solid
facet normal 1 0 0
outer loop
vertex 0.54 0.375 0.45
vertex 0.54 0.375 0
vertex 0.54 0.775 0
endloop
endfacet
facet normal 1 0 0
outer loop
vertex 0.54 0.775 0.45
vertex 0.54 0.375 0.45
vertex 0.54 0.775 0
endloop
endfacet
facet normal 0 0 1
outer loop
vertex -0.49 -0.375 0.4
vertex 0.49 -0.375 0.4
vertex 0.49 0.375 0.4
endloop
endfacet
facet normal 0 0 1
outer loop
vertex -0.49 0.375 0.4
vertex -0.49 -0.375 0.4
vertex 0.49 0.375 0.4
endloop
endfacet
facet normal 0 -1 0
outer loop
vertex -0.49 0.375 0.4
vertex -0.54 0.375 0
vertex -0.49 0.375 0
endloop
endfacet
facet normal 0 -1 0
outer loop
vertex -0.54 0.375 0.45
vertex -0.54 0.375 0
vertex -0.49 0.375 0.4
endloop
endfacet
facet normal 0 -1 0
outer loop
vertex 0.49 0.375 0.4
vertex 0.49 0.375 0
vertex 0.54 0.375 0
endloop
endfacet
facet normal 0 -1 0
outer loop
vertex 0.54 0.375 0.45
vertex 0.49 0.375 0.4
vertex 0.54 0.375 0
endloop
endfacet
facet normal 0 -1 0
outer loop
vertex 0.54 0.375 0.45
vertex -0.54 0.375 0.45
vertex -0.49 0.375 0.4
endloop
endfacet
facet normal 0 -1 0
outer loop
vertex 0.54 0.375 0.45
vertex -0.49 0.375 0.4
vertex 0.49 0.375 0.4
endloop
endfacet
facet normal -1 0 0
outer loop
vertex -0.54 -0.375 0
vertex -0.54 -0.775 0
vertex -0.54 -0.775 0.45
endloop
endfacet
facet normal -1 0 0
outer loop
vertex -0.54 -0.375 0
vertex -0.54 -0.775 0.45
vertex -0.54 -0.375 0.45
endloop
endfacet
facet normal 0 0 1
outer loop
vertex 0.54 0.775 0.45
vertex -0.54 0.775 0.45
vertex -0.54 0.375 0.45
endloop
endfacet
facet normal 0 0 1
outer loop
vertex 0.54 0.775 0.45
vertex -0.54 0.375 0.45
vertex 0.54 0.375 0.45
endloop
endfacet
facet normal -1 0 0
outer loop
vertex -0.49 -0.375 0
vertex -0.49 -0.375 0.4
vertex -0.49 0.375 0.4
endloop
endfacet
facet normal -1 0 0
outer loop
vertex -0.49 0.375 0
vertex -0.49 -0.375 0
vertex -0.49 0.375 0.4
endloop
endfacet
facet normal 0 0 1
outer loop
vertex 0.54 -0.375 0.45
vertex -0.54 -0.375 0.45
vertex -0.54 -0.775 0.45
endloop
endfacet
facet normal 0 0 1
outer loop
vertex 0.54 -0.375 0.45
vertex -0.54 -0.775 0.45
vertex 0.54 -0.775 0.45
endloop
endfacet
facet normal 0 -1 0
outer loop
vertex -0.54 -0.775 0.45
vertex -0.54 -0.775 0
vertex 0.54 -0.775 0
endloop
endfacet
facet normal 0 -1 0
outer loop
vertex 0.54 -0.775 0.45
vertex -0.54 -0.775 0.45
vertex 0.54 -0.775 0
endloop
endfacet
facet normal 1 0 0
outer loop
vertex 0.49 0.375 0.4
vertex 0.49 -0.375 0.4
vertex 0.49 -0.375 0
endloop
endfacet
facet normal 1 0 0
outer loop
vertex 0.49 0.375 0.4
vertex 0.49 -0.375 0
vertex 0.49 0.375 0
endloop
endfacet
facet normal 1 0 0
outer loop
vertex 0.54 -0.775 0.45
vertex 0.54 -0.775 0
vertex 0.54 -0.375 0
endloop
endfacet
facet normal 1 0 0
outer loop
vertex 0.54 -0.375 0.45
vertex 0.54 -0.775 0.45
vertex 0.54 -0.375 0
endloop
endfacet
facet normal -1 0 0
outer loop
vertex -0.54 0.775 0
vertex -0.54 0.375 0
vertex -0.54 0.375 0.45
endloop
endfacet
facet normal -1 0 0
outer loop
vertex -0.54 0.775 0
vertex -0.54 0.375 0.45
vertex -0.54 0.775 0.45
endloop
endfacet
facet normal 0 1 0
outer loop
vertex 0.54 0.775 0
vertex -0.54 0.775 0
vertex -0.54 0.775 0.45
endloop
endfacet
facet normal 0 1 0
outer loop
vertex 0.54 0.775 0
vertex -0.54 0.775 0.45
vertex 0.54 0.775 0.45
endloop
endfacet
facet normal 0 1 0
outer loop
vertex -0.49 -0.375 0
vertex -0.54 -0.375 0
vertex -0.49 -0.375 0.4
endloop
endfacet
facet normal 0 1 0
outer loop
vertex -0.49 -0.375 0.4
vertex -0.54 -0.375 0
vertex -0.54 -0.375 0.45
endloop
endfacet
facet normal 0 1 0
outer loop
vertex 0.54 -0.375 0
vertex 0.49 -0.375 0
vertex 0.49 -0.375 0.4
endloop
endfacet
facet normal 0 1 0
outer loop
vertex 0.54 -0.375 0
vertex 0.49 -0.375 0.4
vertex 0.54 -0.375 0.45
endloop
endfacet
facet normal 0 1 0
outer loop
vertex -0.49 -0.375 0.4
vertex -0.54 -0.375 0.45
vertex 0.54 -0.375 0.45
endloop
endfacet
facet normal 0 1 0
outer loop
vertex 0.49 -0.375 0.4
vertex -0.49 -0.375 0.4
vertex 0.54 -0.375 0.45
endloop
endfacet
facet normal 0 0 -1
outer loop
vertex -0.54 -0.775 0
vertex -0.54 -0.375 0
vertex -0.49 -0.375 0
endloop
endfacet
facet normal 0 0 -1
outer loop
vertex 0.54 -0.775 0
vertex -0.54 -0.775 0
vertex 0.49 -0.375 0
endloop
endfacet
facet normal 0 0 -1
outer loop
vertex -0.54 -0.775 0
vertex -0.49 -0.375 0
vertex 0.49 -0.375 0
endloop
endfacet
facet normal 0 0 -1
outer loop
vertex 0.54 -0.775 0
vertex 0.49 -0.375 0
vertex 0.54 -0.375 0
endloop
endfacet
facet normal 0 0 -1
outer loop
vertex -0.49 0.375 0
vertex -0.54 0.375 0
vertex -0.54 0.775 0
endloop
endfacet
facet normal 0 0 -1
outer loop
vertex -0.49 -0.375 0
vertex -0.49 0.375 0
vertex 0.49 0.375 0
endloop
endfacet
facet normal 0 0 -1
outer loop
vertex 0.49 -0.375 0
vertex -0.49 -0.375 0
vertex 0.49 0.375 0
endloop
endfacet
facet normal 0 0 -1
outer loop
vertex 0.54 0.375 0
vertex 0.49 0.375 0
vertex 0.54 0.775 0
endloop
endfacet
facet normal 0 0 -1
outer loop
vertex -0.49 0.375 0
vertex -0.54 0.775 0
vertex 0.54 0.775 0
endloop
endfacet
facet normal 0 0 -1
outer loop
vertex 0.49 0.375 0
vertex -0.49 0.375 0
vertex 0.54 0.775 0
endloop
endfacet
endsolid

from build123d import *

# Parameters (mm, degrees)
COMPONENT_OUTLINE_W = 1.08
COMPONENT_OUTLINE_H = 1.55
EXTRUDE1_DEPTH      = 0.45
SKETCH2_W           = 0.05
SKETCH2_H           = 0.75
CUT_EXTRUDE1_DEPTH  = 1.45
SKETCH3_W           = 0.05
SKETCH3_H           = 0.75
CUT_EXTRUDE2_DEPTH  = 2.03


with BuildPart() as part:
    # COMPONENT_OUTLINE → Extrude1 (new body)
    with BuildSketch(Plane.XY):
        Rectangle(COMPONENT_OUTLINE_W, COMPONENT_OUTLINE_H)
    extrude(amount=EXTRUDE1_DEPTH)

    # Sketch2 → Cut-Extrude1 (cut, through all)
    with BuildSketch(Plane.XY.offset(0.45)):
        with Locations((-0.515, 0)):
            Rectangle(SKETCH2_W, SKETCH2_H)
        with Locations((0.515, 0)):
            Rectangle(SKETCH2_W, SKETCH2_H)
    extrude(amount=-CUT_EXTRUDE1_DEPTH, mode=Mode.SUBTRACT)

    # Sketch3 → Cut-Extrude2 (cut, through all)
    with BuildSketch(Plane(origin=(0.49, 0, 0), x_dir=(0, 0, -1), z_dir=(1, 0, 0))):
        with Locations((-0.425, 0)):
            Rectangle(SKETCH3_W, SKETCH3_H)
    extrude(amount=-CUT_EXTRUDE2_DEPTH, mode=Mode.SUBTRACT)


solid = part.part
